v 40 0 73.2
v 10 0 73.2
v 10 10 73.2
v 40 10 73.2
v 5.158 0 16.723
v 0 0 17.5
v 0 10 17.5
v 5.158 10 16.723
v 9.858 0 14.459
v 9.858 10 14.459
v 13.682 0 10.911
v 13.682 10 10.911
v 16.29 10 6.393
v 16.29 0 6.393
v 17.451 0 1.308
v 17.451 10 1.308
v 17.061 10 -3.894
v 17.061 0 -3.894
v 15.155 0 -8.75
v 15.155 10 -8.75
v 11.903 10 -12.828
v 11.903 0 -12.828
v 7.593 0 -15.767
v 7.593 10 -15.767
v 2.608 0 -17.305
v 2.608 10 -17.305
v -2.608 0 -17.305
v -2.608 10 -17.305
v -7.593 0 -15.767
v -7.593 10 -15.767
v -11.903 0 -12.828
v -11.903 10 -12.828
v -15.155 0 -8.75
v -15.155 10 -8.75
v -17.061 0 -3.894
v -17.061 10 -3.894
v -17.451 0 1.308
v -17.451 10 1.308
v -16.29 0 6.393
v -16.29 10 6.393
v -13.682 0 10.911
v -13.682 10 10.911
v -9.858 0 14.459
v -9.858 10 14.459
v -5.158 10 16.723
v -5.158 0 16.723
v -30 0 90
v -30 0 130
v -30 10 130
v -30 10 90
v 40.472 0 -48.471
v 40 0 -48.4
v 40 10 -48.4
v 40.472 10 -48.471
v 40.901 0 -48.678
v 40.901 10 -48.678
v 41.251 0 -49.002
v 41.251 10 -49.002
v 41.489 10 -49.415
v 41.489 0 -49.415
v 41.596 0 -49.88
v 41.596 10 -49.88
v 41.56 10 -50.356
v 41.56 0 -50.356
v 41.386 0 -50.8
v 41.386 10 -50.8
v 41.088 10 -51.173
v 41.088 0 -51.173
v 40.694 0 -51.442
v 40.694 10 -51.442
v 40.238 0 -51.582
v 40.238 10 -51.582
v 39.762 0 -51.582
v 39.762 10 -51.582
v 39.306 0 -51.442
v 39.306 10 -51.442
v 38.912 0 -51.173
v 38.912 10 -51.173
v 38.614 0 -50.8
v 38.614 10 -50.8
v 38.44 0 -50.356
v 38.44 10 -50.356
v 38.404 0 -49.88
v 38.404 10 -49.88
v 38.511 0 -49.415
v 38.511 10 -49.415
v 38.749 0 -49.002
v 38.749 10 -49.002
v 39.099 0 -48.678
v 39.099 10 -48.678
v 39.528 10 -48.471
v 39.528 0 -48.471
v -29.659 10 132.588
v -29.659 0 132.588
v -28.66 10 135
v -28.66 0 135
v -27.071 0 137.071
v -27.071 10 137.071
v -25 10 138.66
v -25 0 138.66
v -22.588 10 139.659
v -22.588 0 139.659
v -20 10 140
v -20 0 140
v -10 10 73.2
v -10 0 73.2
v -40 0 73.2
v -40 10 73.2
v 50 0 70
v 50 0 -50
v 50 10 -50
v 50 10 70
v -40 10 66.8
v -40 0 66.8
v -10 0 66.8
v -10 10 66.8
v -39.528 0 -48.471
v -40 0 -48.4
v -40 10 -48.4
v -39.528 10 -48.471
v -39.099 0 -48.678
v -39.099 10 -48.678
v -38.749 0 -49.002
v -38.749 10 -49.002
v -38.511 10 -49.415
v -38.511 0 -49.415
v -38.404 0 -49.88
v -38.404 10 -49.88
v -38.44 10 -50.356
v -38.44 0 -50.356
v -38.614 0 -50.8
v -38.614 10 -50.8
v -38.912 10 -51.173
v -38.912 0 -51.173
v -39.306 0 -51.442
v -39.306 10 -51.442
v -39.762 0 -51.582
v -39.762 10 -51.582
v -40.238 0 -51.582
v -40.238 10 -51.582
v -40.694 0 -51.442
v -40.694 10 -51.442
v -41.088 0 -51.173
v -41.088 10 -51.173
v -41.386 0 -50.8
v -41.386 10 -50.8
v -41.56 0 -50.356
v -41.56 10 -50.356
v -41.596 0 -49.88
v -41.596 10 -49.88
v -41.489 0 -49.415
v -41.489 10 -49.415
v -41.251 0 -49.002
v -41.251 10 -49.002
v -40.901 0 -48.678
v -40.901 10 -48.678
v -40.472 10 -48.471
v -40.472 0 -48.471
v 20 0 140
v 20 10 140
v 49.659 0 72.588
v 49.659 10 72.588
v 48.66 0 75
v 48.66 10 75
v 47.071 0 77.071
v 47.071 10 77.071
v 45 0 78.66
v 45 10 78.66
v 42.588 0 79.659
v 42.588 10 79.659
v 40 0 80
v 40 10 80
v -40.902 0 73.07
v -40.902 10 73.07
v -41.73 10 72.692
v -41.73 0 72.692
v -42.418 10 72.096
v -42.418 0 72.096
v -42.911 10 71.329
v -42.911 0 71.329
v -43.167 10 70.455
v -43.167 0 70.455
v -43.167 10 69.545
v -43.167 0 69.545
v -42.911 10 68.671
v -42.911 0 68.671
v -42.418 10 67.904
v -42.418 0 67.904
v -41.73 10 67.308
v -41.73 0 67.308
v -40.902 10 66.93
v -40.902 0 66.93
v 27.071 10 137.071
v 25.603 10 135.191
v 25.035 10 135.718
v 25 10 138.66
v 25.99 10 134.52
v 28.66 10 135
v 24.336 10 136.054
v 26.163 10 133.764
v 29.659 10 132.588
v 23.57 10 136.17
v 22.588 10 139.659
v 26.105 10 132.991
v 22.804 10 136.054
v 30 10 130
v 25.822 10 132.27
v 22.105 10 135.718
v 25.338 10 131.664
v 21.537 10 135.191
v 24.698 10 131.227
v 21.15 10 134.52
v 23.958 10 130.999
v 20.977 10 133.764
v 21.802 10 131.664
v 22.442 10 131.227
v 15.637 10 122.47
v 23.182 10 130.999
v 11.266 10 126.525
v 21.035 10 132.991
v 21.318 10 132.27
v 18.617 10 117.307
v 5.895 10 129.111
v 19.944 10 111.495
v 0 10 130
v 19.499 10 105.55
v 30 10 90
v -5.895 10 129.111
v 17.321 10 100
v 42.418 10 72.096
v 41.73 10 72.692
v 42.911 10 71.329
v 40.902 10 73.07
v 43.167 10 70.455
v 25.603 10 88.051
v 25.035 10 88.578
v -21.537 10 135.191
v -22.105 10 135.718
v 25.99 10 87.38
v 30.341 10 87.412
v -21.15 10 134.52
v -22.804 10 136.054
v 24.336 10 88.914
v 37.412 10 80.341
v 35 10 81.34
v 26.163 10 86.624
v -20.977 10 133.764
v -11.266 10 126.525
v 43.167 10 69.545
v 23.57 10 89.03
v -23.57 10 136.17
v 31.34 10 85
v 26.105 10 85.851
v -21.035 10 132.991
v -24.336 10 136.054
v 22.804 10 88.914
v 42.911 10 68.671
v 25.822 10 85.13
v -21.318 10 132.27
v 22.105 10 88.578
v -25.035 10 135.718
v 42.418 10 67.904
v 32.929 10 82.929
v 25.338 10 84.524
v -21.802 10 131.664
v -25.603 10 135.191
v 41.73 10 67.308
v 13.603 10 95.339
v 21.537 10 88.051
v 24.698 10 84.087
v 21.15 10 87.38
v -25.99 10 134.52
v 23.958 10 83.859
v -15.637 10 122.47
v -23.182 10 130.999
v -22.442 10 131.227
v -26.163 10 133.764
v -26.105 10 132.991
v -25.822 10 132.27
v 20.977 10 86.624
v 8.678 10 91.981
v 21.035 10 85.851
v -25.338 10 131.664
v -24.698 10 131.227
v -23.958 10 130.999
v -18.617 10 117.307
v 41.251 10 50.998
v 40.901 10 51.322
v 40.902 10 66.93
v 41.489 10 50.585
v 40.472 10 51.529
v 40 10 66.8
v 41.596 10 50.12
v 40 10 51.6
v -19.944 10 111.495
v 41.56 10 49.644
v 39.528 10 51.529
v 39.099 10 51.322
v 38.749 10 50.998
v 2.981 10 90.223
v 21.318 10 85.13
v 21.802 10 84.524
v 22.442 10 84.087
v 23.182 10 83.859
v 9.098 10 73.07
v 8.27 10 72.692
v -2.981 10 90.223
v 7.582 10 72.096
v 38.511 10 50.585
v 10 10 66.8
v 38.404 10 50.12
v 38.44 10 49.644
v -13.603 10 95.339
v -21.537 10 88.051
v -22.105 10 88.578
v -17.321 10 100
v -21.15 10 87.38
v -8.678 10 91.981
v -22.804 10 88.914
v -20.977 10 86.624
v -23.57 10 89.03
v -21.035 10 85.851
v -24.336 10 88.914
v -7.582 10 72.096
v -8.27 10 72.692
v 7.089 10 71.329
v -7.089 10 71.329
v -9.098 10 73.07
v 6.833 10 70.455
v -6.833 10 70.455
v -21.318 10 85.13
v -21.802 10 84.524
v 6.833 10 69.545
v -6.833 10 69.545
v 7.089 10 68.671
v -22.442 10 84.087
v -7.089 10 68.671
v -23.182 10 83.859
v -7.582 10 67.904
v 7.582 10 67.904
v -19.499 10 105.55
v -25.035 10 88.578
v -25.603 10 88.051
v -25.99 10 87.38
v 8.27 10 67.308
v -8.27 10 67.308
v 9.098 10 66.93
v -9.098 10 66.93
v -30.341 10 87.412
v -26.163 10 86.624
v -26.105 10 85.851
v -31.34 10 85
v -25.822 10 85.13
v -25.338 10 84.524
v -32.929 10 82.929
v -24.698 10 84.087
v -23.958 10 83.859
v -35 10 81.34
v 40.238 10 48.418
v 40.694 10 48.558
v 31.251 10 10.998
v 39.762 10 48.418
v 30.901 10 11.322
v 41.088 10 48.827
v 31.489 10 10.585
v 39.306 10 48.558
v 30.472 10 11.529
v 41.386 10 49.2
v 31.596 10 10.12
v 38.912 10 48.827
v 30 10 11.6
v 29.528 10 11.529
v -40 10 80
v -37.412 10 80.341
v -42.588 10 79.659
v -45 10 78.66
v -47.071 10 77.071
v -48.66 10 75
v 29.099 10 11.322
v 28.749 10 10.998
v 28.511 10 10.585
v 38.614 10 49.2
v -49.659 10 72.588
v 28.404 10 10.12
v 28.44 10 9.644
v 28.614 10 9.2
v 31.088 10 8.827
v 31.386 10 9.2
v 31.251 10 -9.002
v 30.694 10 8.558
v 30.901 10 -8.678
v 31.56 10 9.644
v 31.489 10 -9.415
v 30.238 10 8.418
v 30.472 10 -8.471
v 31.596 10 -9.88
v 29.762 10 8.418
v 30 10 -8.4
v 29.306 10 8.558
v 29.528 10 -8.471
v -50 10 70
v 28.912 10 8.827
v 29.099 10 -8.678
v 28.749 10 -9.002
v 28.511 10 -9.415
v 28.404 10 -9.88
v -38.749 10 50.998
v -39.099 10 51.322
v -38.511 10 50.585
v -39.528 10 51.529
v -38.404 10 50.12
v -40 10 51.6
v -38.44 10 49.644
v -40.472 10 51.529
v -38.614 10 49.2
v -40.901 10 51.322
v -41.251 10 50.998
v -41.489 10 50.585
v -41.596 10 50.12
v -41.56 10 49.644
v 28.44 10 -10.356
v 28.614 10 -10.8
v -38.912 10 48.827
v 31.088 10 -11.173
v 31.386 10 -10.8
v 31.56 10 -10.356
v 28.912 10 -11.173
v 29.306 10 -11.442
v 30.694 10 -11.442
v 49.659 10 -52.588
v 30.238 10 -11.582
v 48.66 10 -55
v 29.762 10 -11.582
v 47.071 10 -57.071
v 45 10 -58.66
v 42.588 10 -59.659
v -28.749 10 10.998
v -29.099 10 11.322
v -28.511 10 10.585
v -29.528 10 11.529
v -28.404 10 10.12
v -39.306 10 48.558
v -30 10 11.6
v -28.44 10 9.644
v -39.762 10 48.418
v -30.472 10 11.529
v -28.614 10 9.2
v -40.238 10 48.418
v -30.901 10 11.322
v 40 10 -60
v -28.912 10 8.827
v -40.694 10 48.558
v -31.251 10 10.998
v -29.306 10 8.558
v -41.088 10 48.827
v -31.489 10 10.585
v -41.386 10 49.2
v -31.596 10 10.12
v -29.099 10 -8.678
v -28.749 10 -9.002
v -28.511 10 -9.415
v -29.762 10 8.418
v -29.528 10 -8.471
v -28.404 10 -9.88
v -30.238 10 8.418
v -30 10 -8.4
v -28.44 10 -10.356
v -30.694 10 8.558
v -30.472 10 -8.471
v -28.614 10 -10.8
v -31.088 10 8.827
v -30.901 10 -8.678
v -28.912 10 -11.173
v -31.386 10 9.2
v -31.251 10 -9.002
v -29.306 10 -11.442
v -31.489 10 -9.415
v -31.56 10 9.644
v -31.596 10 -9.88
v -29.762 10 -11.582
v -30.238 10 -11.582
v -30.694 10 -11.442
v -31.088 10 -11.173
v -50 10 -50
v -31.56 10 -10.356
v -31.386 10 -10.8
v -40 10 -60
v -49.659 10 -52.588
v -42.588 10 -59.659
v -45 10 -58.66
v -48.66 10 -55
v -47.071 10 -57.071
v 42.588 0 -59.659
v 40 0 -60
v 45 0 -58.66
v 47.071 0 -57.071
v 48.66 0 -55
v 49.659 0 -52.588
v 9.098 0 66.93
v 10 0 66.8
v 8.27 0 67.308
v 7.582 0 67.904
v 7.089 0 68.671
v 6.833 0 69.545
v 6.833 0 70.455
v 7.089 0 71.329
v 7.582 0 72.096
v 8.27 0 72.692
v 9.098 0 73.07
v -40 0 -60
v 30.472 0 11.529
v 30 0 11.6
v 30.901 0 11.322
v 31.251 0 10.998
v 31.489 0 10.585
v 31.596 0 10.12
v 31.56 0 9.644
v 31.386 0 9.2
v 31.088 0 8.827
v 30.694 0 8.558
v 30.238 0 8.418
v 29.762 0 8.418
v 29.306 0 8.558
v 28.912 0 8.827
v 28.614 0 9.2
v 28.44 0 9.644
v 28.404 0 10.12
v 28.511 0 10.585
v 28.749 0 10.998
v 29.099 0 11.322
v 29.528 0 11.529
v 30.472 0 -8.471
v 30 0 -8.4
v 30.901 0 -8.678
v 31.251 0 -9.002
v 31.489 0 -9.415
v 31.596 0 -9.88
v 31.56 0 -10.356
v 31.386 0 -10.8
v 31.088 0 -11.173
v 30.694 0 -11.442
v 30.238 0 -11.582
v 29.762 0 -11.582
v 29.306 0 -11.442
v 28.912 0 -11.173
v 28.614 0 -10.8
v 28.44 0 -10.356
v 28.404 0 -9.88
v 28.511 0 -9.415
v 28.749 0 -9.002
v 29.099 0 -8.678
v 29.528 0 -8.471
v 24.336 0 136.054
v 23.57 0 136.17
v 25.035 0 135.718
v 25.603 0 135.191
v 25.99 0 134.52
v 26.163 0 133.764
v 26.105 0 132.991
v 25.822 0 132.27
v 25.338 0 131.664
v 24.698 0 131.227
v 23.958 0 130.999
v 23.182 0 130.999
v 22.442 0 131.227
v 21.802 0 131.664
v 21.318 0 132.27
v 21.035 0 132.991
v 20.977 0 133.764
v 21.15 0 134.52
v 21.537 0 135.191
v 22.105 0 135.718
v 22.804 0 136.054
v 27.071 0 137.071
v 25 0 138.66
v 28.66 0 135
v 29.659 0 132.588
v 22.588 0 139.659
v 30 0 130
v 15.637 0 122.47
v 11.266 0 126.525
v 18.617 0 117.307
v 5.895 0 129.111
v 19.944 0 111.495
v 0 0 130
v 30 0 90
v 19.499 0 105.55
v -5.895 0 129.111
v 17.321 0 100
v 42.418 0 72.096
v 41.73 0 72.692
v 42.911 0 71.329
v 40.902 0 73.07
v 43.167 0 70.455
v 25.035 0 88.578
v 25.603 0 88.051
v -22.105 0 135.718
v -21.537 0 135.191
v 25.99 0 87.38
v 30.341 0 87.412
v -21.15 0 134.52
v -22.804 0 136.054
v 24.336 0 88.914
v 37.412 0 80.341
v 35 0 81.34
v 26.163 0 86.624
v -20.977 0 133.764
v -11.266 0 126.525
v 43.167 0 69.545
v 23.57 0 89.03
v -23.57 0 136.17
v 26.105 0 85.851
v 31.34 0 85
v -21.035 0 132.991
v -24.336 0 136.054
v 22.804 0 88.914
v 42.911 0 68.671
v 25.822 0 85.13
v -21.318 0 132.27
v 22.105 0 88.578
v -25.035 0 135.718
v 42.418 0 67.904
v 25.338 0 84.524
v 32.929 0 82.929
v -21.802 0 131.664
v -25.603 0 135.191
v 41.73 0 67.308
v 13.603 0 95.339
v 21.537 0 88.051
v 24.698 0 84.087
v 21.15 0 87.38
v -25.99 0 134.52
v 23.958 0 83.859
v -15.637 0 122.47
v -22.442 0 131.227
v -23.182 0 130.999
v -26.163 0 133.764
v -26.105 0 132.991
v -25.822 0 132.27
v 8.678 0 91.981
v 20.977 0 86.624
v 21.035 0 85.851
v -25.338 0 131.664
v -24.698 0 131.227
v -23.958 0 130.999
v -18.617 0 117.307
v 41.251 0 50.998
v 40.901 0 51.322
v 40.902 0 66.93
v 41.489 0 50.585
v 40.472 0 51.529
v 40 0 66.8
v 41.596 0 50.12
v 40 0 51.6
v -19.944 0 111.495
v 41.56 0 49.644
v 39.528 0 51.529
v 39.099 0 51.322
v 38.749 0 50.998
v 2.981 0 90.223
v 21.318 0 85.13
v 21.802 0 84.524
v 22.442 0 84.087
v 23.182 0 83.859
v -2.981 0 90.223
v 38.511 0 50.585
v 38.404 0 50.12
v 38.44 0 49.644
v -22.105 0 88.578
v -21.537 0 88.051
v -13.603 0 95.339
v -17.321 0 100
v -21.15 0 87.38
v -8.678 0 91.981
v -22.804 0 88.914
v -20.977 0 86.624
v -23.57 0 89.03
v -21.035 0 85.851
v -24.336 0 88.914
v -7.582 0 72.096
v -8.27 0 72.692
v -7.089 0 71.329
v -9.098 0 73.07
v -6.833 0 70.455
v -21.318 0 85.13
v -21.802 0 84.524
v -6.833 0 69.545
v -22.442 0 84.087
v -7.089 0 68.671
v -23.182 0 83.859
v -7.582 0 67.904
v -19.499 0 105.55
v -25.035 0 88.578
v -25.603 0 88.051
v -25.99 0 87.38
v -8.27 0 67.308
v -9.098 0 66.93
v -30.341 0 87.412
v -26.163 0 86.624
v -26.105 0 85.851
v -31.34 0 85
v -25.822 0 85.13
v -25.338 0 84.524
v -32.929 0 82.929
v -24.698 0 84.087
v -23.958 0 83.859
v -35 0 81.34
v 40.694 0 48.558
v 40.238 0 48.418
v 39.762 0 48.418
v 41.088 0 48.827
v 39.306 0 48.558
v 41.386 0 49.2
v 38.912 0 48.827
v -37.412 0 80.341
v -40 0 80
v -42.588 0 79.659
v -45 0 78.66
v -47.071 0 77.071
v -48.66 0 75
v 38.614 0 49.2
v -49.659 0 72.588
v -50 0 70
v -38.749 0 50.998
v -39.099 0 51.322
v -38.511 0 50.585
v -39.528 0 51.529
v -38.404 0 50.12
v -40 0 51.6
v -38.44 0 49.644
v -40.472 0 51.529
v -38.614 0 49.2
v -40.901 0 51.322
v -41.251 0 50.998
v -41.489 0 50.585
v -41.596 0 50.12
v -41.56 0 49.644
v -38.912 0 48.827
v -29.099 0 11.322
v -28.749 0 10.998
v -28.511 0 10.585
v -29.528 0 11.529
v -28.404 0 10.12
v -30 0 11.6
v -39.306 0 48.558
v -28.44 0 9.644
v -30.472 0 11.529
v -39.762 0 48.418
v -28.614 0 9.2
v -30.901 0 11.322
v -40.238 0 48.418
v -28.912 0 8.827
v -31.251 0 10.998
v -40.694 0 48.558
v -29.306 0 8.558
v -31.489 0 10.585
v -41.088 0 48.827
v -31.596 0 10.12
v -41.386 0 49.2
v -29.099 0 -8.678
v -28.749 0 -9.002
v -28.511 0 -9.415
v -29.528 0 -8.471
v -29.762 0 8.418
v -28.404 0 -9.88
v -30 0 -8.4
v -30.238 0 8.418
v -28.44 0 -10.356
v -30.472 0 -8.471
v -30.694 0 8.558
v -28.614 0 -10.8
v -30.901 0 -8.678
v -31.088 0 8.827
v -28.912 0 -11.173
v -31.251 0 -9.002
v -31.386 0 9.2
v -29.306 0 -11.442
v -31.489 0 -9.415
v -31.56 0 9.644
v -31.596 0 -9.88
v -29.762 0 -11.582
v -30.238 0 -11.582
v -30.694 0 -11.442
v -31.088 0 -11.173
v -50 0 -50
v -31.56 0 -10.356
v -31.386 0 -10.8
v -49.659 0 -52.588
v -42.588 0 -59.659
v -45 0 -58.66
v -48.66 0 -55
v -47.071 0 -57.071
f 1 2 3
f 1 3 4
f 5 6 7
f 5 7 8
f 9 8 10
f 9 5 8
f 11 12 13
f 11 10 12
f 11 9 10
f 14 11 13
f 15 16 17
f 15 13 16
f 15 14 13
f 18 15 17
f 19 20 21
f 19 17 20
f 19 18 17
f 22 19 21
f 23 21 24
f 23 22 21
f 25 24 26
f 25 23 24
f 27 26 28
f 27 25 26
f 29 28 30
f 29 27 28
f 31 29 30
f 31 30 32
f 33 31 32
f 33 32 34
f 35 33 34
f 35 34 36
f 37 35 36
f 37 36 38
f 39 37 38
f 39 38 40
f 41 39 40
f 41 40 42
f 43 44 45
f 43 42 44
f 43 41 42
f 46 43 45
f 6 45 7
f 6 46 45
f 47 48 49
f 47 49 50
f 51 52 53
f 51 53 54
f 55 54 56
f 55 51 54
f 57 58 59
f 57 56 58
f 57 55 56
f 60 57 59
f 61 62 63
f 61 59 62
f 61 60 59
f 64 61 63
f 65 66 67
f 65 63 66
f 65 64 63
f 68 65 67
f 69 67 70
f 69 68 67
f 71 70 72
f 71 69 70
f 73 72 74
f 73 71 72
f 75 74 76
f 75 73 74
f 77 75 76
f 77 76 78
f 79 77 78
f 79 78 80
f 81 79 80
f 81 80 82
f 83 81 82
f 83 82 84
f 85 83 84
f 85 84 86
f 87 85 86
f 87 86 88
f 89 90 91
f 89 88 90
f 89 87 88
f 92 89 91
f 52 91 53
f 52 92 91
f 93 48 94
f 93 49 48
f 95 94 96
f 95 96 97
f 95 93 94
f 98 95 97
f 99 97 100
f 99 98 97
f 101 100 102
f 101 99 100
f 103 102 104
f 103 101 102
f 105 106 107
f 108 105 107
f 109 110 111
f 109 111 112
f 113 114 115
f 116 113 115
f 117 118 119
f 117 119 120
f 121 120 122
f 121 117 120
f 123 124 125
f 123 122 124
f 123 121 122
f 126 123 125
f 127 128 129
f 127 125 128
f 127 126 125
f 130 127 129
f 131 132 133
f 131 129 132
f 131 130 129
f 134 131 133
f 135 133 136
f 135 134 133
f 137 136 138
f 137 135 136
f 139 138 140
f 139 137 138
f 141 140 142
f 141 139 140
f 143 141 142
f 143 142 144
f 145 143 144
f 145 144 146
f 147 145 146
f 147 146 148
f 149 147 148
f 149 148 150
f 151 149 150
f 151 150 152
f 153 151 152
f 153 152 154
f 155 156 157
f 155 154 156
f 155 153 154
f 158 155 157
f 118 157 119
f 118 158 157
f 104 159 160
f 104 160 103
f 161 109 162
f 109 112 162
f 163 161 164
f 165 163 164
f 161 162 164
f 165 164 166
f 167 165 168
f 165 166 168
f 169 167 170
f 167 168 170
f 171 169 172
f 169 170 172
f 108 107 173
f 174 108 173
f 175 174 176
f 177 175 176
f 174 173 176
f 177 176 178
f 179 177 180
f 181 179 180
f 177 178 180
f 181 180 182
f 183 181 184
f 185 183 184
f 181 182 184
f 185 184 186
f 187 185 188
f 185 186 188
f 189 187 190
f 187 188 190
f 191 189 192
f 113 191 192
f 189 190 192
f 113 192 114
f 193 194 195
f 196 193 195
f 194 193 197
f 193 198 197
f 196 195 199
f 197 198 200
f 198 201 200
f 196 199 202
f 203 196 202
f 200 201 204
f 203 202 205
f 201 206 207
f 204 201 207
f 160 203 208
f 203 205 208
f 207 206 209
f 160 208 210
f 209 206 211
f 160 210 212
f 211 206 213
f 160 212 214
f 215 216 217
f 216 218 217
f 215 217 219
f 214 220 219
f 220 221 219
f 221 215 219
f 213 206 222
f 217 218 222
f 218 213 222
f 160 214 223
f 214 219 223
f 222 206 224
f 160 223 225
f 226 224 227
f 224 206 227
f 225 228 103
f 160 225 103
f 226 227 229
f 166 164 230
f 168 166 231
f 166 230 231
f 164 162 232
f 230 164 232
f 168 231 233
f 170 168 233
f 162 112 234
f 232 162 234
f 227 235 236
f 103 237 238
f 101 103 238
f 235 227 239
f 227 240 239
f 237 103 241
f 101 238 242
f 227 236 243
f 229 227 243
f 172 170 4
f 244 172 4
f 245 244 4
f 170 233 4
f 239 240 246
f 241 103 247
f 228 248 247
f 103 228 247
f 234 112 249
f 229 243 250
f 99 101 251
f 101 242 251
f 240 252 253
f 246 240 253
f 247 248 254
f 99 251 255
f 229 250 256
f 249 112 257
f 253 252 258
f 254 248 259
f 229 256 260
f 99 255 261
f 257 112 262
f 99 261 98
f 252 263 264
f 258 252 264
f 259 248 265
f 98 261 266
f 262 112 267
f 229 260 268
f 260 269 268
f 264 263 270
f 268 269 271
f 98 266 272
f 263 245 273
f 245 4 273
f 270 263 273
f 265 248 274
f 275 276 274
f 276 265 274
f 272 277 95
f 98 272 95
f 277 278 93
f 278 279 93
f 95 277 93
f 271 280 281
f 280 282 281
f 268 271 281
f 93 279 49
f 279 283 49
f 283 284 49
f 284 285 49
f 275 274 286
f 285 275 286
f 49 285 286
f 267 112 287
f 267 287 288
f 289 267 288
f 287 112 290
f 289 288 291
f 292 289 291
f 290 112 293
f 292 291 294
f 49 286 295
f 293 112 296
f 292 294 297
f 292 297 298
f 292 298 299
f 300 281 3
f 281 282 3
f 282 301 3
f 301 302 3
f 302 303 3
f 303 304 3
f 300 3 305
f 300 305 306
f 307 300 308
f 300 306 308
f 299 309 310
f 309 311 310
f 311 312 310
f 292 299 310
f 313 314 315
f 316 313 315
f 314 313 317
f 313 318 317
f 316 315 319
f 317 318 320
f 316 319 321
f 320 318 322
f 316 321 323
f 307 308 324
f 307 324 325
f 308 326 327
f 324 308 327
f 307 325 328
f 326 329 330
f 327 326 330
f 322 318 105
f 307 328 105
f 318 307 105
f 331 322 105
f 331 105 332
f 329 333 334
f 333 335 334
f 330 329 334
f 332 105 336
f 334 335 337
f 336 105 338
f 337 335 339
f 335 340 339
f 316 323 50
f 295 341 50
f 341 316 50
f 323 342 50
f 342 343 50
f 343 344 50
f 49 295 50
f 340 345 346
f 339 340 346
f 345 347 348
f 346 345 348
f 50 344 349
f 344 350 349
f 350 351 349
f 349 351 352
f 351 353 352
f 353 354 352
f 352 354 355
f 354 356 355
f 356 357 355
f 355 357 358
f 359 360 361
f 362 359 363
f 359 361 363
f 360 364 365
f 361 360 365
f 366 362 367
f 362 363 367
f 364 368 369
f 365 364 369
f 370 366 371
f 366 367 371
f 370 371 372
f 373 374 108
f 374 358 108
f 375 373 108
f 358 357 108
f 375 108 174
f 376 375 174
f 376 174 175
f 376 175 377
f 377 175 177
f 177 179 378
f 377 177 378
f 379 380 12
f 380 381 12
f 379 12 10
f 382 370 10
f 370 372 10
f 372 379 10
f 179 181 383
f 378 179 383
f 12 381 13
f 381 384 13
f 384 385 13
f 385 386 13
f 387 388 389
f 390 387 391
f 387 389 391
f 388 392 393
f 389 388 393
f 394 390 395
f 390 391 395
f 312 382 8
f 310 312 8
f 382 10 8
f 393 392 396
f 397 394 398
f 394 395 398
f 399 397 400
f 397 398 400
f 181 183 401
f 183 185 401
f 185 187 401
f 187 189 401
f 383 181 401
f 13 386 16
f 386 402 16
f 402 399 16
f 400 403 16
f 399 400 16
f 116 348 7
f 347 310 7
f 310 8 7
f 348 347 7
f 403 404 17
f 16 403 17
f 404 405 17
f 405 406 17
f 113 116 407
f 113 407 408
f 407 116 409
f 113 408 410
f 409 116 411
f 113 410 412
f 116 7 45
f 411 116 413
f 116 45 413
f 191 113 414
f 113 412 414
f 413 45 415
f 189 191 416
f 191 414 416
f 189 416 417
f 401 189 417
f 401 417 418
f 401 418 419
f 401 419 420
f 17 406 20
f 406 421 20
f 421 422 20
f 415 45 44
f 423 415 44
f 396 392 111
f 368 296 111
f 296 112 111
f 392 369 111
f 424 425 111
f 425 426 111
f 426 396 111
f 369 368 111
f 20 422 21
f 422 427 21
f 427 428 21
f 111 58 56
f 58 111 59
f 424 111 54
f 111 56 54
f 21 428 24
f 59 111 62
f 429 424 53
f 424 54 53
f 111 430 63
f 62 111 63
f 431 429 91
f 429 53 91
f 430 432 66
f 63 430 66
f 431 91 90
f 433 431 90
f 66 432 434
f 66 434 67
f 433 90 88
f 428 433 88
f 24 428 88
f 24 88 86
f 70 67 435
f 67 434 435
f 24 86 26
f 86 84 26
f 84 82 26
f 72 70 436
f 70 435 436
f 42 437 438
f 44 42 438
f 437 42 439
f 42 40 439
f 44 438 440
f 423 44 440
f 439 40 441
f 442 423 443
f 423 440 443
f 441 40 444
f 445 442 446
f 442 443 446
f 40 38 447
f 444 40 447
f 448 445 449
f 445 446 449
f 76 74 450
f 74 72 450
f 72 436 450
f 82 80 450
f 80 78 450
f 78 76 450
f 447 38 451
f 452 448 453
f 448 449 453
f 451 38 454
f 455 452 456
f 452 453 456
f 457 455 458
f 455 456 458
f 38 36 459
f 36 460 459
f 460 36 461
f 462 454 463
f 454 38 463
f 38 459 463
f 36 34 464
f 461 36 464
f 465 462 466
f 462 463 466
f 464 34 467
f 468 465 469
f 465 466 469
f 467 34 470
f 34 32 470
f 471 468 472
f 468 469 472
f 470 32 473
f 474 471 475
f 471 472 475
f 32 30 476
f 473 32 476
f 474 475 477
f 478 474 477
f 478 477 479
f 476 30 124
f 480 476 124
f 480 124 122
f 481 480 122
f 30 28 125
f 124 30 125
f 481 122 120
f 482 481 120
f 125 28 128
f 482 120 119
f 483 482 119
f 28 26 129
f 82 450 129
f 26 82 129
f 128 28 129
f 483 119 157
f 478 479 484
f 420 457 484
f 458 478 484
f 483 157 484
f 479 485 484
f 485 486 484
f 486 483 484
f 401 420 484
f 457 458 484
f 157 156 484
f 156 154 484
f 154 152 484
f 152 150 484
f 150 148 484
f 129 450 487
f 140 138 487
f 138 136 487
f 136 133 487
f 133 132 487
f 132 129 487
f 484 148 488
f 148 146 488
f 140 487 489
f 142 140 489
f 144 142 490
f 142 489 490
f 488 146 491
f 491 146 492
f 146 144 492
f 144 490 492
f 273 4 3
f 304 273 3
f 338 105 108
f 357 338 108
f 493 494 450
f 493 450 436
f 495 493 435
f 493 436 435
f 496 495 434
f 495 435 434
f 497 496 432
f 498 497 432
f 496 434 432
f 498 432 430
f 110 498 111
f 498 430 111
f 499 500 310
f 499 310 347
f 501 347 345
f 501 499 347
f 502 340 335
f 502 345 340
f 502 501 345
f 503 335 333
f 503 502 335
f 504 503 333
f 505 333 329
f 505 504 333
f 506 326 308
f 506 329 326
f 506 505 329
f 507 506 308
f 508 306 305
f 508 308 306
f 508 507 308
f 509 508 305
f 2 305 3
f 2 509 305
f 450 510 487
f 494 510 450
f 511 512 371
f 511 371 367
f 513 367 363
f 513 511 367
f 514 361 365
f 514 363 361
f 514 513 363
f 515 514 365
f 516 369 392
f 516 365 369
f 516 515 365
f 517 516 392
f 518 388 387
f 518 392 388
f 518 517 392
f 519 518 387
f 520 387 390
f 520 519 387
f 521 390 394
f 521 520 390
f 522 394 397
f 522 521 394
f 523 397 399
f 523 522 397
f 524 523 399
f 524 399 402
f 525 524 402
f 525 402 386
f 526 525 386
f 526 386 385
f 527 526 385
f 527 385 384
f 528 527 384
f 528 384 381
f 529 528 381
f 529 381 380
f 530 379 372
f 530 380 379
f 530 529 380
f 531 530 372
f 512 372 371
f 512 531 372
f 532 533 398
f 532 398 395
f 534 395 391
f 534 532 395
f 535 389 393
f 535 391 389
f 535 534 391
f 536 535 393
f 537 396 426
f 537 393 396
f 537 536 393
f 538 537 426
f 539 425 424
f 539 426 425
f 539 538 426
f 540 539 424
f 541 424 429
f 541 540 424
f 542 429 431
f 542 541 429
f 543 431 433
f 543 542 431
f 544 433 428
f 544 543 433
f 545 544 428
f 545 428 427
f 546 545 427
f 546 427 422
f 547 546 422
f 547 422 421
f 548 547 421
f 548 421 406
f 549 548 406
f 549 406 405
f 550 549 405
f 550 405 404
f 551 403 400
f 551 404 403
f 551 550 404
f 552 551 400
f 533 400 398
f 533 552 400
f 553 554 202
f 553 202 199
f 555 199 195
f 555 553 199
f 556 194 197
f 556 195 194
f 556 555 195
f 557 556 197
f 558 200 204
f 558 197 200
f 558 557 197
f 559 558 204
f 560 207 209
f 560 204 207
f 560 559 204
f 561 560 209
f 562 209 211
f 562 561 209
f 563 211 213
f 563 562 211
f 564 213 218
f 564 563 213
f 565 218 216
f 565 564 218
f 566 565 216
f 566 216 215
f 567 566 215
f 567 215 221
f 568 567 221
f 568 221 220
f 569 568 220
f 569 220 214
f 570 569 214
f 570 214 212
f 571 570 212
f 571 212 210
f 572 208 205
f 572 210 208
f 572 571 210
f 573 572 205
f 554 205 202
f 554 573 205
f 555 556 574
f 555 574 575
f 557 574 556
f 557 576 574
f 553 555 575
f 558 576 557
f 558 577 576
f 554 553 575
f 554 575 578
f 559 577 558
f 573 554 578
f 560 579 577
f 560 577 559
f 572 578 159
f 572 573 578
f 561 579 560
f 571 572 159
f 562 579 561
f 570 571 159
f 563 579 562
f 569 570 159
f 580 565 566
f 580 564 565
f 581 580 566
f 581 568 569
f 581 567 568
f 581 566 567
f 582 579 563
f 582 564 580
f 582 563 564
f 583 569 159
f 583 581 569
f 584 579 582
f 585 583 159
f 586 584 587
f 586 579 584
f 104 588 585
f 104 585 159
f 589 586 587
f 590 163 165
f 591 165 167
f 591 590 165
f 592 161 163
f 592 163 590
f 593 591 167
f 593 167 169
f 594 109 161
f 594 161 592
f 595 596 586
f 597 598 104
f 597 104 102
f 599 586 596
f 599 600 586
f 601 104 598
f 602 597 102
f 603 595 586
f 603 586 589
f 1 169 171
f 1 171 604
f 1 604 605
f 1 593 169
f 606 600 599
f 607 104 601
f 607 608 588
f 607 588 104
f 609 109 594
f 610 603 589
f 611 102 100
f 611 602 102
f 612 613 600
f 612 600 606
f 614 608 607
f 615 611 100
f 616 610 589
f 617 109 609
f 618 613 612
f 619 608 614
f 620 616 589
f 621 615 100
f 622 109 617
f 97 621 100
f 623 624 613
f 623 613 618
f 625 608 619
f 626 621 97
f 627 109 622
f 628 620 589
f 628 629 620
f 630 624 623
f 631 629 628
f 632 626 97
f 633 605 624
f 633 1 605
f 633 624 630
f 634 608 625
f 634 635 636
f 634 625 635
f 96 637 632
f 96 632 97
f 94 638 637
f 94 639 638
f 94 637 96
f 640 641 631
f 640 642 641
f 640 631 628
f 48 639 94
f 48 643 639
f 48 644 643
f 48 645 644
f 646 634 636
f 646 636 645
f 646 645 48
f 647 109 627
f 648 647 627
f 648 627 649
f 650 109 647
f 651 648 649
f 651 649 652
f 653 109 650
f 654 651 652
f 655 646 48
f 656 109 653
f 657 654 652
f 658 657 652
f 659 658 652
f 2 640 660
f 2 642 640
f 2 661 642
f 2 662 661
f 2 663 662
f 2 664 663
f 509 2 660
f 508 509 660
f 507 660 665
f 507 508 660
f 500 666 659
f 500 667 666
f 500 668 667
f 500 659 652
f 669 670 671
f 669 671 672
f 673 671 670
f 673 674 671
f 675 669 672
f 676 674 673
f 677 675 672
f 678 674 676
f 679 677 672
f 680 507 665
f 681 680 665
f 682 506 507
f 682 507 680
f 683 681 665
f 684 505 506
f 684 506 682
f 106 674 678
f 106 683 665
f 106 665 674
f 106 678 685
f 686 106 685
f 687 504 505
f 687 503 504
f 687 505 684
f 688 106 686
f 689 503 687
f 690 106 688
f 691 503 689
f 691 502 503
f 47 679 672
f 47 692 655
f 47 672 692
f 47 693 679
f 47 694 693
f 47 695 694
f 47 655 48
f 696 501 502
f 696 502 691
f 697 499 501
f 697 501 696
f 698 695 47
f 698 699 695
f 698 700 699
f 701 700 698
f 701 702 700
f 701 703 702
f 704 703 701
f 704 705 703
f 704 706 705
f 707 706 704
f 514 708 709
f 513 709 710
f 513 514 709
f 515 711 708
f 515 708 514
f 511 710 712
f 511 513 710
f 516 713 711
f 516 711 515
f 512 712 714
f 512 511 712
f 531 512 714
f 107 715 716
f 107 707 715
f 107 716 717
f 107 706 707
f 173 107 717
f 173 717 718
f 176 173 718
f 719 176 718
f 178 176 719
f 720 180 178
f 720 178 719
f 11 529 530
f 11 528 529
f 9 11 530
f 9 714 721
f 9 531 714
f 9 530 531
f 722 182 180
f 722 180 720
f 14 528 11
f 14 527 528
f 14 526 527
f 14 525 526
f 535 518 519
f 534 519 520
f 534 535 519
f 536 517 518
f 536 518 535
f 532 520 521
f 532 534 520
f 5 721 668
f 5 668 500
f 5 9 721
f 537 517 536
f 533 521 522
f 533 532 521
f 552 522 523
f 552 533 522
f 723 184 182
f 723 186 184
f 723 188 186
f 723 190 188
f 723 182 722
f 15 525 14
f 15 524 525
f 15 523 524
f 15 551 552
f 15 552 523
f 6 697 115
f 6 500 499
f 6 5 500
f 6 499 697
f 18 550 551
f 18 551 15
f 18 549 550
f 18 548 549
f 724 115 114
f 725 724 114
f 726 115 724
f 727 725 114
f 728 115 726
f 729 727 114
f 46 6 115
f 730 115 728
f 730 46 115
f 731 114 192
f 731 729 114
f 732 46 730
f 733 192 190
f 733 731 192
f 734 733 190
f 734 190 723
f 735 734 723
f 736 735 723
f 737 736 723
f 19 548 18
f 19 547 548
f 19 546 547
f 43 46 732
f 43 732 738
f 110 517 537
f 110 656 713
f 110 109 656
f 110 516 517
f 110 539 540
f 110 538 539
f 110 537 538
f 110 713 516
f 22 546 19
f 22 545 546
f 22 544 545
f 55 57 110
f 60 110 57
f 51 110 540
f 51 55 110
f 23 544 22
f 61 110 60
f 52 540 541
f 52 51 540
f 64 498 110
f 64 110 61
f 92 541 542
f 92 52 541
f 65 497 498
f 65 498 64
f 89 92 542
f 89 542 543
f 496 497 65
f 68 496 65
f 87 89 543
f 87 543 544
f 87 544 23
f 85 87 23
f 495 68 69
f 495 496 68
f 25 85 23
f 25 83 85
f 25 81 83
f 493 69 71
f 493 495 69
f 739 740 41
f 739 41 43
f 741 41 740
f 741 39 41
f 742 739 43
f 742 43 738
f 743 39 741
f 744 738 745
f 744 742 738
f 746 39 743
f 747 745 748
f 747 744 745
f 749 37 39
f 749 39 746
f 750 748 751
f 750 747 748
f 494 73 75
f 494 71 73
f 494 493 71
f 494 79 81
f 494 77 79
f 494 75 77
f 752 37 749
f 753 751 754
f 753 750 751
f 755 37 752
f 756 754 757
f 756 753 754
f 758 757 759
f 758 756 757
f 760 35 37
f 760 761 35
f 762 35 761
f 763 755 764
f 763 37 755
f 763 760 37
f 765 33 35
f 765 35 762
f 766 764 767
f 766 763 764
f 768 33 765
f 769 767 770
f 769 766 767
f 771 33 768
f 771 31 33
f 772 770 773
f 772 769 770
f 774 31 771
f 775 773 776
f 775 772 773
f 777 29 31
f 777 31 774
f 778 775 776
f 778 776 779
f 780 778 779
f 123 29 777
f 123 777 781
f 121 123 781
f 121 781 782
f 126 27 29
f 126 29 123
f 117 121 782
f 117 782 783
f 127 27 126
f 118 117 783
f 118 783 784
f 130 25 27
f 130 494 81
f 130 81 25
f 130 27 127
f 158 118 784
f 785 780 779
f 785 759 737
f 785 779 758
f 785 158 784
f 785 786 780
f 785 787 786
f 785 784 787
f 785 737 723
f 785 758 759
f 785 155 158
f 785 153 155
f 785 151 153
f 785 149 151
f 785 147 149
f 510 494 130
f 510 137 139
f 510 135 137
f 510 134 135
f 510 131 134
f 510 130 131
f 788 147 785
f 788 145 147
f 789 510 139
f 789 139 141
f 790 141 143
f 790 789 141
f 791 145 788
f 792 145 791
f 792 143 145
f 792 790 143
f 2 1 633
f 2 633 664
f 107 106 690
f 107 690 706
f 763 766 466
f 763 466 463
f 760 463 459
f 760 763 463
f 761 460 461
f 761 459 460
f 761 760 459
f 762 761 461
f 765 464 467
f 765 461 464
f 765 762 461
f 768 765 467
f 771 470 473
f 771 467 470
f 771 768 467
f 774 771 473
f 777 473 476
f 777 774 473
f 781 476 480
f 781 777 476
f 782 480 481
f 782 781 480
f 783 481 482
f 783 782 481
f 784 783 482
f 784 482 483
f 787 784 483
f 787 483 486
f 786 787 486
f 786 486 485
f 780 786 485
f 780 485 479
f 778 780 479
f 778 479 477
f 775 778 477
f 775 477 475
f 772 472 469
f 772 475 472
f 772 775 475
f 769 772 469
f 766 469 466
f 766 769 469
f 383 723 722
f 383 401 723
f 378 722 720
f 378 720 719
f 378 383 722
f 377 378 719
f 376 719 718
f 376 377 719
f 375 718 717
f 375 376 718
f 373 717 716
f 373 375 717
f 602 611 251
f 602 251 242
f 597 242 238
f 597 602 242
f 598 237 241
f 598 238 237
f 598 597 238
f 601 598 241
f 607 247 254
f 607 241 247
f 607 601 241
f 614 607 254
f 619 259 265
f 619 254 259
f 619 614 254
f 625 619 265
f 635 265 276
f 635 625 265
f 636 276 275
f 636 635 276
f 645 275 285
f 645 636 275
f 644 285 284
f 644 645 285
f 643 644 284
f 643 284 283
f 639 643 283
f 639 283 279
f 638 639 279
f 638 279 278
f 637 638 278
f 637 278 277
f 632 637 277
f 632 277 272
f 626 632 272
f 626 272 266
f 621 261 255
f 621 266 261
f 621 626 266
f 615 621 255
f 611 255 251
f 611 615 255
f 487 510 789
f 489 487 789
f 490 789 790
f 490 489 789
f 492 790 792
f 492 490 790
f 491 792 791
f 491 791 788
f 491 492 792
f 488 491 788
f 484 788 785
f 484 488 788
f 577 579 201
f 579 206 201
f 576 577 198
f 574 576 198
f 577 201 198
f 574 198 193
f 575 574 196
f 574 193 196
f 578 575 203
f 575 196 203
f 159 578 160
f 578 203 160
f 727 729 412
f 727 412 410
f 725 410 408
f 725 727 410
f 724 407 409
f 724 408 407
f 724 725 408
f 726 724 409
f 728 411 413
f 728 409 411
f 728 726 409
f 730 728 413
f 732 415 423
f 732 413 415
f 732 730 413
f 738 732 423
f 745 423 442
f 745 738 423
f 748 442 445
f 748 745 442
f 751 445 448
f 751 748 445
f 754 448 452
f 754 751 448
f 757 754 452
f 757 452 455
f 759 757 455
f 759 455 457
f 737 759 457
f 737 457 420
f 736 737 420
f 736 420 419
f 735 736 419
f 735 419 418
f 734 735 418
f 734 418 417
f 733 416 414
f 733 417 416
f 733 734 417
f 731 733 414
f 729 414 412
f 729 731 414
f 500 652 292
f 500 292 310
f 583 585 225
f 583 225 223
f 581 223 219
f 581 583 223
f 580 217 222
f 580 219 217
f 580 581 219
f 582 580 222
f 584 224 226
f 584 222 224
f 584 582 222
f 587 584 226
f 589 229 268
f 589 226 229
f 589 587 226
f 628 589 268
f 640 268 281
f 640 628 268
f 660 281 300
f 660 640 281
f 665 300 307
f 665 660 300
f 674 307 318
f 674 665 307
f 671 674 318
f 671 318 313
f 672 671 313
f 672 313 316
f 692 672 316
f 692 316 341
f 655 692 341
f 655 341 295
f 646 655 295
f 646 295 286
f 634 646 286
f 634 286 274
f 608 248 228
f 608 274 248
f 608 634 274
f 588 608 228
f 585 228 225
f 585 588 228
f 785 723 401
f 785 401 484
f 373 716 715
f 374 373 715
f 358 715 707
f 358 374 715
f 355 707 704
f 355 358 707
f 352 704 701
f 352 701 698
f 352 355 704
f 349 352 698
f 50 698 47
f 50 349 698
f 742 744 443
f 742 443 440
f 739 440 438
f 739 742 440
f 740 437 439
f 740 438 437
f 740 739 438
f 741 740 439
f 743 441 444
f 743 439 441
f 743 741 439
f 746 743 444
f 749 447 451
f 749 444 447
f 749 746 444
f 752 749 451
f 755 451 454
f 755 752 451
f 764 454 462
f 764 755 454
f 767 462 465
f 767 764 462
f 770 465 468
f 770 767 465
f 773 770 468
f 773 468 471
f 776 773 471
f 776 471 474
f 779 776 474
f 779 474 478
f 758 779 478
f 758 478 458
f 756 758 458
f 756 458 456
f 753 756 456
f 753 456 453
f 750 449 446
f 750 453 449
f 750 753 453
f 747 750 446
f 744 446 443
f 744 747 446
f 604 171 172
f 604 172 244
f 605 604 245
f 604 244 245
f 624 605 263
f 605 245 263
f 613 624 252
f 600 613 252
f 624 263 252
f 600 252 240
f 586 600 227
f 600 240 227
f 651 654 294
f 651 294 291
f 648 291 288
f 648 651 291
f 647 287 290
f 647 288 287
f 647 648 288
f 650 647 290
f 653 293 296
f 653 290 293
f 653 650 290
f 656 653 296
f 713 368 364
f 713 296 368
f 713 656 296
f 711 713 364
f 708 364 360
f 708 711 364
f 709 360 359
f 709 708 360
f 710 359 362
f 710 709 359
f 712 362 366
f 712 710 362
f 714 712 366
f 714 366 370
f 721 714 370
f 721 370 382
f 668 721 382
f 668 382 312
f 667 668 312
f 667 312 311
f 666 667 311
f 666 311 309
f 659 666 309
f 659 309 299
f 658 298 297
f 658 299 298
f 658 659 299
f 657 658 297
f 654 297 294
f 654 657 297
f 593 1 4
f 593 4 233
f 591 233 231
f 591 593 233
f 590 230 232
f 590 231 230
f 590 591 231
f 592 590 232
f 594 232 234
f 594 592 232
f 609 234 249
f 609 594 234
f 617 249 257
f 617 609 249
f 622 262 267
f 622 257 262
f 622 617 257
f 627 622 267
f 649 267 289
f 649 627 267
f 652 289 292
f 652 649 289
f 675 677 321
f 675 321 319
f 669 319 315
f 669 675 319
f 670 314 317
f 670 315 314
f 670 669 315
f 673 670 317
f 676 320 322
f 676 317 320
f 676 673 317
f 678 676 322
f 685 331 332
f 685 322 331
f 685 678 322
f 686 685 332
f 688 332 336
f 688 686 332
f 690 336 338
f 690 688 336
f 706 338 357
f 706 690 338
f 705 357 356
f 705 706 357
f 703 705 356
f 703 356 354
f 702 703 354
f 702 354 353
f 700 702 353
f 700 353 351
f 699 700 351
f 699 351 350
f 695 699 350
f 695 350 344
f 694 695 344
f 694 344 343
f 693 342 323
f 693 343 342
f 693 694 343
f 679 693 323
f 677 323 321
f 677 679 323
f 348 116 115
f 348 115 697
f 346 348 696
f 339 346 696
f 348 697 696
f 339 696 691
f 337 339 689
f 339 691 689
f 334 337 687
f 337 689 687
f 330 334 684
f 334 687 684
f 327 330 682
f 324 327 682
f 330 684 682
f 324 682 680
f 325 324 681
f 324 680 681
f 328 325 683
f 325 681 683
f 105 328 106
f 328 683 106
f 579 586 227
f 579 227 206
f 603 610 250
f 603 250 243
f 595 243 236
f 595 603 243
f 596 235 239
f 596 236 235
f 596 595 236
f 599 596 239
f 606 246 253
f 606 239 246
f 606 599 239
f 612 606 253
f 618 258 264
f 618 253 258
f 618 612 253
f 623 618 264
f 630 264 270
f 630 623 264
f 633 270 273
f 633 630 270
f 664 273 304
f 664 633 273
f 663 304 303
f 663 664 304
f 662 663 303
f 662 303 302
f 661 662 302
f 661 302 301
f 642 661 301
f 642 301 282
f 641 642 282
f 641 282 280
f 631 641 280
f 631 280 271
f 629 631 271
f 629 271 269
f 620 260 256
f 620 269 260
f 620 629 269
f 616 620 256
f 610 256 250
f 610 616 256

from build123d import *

# Parameters (mm, degrees)
BOSS_EXTRUDE1_DEPTH     = 10
CUT_EXTRUDE1_DEPTH      = 149.996644258
CUT_EXTRUDE1_DEPTH_BACK = 149.996644258
SKETCH2_R               = 17.5
SKETCH2_R_2             = 1.6
CUT_EXTRUDE2_DEPTH      = 149.996644258
CUT_EXTRUDE2_DEPTH_BACK = 149.996644258
SKETCH3_R               = 20
SKETCH3_R_2             = 2.6
CUT_EXTRUDE3_DEPTH      = 149.996644258
CUT_EXTRUDE3_DEPTH_BACK = 149.996644258
SKETCH4_R               = 1.6
FILLET1_R               = 10


with BuildPart() as part:
    # Sketch1 → Boss-Extrude1 (new body)
    with BuildSketch(Plane(origin=(0, 0, 0), x_dir=(1, 0, 0), z_dir=(0, 1, 0))):
        Polygon((-50, 60), (50, 60), (50, -80), (30, -80), (30, -140), (-30, -140), (-30, -80), (-50, -80), align=None)
    extrude(amount=BOSS_EXTRUDE1_DEPTH)

    # Sketch2 → Cut-Extrude1 (cut, two sides: drawn at the far end of the back side and taken through both)
    with BuildSketch(Plane(origin=(0, 10, 0), x_dir=(1, 0, 0), z_dir=(0, 1, 0)).offset(-CUT_EXTRUDE1_DEPTH_BACK)):
        with Locations(Location((0, 0, 0), (0, 0, 270))):
            Circle(SKETCH2_R)
        with Locations(Location((-40, -50, 0), (0, 0, 270))):
            Circle(SKETCH2_R_2)
        with Locations(Location((40, -50, 0), (0, 0, 270))):
            Circle(SKETCH2_R_2)
        with Locations(Location((40, 50, 0), (0, 0, 270))):
            Circle(SKETCH2_R_2)
        with Locations(Location((-40, 50, 0), (0, 0, 270))):
            Circle(SKETCH2_R_2)
        with Locations((-40, -130)):
            Circle(SKETCH2_R_2)
        with Locations((40, -130)):
            Circle(SKETCH2_R_2)
        with Locations((-40, -100)):
            Circle(SKETCH2_R_2)
        with Locations((40, -100)):
            Circle(SKETCH2_R_2)
    extrude(amount=CUT_EXTRUDE1_DEPTH + CUT_EXTRUDE1_DEPTH_BACK, mode=Mode.SUBTRACT)

    # Sketch3 → Cut-Extrude2 (cut, two sides: drawn at the far end of the back side and taken through both)
    with BuildSketch(Plane(origin=(0, 10, 0), x_dir=(1, 0, 0), z_dir=(0, 1, 0)).offset(-CUT_EXTRUDE2_DEPTH_BACK)):
        with Locations(Location((0, -110, 0), (0, 0, 270))):
            Circle(SKETCH3_R)
        with Locations(Location((-23.57, -86.43, 0), (0, 0, 270))):
            Circle(SKETCH3_R_2)
        with Locations(Location((23.57, -86.43, 0), (0, 0, 270))):
            Circle(SKETCH3_R_2)
        with Locations(Location((23.57, -133.57, 0), (0, 0, 270))):
            Circle(SKETCH3_R_2)
        with Locations(Location((-23.57, -133.57, 0), (0, 0, 270))):
            Circle(SKETCH3_R_2)
        with BuildLine():
            Line((-40, -66.8), (-10, -66.8))
            ThreePointArc((-10, -66.8), (-6.8, -70), (-10, -73.2))
            Line((-10, -73.2), (-40, -73.2))
            ThreePointArc((-40, -73.2), (-43.2, -70), (-40, -66.8))
        make_face()
        with BuildLine():
            Line((40, -66.8), (10, -66.8))
            ThreePointArc((10, -66.8), (6.8, -70), (10, -73.2))
            Line((10, -73.2), (40, -73.2))
            ThreePointArc((40, -73.2), (43.2, -70), (40, -66.8))
        make_face()
    extrude(amount=CUT_EXTRUDE2_DEPTH + CUT_EXTRUDE2_DEPTH_BACK, mode=Mode.SUBTRACT)

    # Sketch4 → Cut-Extrude3 (cut, two sides: drawn at the far end of the back side and taken through both)
    with BuildSketch(Plane(origin=(0, 10, 0), x_dir=(1, 0, 0), z_dir=(0, 1, 0)).offset(-CUT_EXTRUDE3_DEPTH_BACK)):
        with Locations(Location((-30, 10, 0), (0, 0, 270))):
            Circle(SKETCH4_R)
        with Locations(Location((-30, -10, 0), (0, 0, 270))):
            Circle(SKETCH4_R)
        with Locations(Location((30, 10, 0), (0, 0, 270))):
            Circle(SKETCH4_R)
        with Locations(Location((30, -10, 0), (0, 0, 270))):
            Circle(SKETCH4_R)
    extrude(amount=CUT_EXTRUDE3_DEPTH + CUT_EXTRUDE3_DEPTH_BACK, mode=Mode.SUBTRACT)

    # Fillet1
    fillet1_edges = [part.edges().sort_by_distance(p)[0] for p in [
        (50, 5, -60),
        (-50, 5, -60),
        (-30, 5, 80),
        (-30, 5, 140),
        (30, 5, 140),
        (30, 5, 80),
        (50, 5, 80),
        (-50, 5, 80),
    ]]
    fillet(fillet1_edges, radius=FILLET1_R - 0.0001)  # a hair under: the kernel refuses the full size


solid = part.part
